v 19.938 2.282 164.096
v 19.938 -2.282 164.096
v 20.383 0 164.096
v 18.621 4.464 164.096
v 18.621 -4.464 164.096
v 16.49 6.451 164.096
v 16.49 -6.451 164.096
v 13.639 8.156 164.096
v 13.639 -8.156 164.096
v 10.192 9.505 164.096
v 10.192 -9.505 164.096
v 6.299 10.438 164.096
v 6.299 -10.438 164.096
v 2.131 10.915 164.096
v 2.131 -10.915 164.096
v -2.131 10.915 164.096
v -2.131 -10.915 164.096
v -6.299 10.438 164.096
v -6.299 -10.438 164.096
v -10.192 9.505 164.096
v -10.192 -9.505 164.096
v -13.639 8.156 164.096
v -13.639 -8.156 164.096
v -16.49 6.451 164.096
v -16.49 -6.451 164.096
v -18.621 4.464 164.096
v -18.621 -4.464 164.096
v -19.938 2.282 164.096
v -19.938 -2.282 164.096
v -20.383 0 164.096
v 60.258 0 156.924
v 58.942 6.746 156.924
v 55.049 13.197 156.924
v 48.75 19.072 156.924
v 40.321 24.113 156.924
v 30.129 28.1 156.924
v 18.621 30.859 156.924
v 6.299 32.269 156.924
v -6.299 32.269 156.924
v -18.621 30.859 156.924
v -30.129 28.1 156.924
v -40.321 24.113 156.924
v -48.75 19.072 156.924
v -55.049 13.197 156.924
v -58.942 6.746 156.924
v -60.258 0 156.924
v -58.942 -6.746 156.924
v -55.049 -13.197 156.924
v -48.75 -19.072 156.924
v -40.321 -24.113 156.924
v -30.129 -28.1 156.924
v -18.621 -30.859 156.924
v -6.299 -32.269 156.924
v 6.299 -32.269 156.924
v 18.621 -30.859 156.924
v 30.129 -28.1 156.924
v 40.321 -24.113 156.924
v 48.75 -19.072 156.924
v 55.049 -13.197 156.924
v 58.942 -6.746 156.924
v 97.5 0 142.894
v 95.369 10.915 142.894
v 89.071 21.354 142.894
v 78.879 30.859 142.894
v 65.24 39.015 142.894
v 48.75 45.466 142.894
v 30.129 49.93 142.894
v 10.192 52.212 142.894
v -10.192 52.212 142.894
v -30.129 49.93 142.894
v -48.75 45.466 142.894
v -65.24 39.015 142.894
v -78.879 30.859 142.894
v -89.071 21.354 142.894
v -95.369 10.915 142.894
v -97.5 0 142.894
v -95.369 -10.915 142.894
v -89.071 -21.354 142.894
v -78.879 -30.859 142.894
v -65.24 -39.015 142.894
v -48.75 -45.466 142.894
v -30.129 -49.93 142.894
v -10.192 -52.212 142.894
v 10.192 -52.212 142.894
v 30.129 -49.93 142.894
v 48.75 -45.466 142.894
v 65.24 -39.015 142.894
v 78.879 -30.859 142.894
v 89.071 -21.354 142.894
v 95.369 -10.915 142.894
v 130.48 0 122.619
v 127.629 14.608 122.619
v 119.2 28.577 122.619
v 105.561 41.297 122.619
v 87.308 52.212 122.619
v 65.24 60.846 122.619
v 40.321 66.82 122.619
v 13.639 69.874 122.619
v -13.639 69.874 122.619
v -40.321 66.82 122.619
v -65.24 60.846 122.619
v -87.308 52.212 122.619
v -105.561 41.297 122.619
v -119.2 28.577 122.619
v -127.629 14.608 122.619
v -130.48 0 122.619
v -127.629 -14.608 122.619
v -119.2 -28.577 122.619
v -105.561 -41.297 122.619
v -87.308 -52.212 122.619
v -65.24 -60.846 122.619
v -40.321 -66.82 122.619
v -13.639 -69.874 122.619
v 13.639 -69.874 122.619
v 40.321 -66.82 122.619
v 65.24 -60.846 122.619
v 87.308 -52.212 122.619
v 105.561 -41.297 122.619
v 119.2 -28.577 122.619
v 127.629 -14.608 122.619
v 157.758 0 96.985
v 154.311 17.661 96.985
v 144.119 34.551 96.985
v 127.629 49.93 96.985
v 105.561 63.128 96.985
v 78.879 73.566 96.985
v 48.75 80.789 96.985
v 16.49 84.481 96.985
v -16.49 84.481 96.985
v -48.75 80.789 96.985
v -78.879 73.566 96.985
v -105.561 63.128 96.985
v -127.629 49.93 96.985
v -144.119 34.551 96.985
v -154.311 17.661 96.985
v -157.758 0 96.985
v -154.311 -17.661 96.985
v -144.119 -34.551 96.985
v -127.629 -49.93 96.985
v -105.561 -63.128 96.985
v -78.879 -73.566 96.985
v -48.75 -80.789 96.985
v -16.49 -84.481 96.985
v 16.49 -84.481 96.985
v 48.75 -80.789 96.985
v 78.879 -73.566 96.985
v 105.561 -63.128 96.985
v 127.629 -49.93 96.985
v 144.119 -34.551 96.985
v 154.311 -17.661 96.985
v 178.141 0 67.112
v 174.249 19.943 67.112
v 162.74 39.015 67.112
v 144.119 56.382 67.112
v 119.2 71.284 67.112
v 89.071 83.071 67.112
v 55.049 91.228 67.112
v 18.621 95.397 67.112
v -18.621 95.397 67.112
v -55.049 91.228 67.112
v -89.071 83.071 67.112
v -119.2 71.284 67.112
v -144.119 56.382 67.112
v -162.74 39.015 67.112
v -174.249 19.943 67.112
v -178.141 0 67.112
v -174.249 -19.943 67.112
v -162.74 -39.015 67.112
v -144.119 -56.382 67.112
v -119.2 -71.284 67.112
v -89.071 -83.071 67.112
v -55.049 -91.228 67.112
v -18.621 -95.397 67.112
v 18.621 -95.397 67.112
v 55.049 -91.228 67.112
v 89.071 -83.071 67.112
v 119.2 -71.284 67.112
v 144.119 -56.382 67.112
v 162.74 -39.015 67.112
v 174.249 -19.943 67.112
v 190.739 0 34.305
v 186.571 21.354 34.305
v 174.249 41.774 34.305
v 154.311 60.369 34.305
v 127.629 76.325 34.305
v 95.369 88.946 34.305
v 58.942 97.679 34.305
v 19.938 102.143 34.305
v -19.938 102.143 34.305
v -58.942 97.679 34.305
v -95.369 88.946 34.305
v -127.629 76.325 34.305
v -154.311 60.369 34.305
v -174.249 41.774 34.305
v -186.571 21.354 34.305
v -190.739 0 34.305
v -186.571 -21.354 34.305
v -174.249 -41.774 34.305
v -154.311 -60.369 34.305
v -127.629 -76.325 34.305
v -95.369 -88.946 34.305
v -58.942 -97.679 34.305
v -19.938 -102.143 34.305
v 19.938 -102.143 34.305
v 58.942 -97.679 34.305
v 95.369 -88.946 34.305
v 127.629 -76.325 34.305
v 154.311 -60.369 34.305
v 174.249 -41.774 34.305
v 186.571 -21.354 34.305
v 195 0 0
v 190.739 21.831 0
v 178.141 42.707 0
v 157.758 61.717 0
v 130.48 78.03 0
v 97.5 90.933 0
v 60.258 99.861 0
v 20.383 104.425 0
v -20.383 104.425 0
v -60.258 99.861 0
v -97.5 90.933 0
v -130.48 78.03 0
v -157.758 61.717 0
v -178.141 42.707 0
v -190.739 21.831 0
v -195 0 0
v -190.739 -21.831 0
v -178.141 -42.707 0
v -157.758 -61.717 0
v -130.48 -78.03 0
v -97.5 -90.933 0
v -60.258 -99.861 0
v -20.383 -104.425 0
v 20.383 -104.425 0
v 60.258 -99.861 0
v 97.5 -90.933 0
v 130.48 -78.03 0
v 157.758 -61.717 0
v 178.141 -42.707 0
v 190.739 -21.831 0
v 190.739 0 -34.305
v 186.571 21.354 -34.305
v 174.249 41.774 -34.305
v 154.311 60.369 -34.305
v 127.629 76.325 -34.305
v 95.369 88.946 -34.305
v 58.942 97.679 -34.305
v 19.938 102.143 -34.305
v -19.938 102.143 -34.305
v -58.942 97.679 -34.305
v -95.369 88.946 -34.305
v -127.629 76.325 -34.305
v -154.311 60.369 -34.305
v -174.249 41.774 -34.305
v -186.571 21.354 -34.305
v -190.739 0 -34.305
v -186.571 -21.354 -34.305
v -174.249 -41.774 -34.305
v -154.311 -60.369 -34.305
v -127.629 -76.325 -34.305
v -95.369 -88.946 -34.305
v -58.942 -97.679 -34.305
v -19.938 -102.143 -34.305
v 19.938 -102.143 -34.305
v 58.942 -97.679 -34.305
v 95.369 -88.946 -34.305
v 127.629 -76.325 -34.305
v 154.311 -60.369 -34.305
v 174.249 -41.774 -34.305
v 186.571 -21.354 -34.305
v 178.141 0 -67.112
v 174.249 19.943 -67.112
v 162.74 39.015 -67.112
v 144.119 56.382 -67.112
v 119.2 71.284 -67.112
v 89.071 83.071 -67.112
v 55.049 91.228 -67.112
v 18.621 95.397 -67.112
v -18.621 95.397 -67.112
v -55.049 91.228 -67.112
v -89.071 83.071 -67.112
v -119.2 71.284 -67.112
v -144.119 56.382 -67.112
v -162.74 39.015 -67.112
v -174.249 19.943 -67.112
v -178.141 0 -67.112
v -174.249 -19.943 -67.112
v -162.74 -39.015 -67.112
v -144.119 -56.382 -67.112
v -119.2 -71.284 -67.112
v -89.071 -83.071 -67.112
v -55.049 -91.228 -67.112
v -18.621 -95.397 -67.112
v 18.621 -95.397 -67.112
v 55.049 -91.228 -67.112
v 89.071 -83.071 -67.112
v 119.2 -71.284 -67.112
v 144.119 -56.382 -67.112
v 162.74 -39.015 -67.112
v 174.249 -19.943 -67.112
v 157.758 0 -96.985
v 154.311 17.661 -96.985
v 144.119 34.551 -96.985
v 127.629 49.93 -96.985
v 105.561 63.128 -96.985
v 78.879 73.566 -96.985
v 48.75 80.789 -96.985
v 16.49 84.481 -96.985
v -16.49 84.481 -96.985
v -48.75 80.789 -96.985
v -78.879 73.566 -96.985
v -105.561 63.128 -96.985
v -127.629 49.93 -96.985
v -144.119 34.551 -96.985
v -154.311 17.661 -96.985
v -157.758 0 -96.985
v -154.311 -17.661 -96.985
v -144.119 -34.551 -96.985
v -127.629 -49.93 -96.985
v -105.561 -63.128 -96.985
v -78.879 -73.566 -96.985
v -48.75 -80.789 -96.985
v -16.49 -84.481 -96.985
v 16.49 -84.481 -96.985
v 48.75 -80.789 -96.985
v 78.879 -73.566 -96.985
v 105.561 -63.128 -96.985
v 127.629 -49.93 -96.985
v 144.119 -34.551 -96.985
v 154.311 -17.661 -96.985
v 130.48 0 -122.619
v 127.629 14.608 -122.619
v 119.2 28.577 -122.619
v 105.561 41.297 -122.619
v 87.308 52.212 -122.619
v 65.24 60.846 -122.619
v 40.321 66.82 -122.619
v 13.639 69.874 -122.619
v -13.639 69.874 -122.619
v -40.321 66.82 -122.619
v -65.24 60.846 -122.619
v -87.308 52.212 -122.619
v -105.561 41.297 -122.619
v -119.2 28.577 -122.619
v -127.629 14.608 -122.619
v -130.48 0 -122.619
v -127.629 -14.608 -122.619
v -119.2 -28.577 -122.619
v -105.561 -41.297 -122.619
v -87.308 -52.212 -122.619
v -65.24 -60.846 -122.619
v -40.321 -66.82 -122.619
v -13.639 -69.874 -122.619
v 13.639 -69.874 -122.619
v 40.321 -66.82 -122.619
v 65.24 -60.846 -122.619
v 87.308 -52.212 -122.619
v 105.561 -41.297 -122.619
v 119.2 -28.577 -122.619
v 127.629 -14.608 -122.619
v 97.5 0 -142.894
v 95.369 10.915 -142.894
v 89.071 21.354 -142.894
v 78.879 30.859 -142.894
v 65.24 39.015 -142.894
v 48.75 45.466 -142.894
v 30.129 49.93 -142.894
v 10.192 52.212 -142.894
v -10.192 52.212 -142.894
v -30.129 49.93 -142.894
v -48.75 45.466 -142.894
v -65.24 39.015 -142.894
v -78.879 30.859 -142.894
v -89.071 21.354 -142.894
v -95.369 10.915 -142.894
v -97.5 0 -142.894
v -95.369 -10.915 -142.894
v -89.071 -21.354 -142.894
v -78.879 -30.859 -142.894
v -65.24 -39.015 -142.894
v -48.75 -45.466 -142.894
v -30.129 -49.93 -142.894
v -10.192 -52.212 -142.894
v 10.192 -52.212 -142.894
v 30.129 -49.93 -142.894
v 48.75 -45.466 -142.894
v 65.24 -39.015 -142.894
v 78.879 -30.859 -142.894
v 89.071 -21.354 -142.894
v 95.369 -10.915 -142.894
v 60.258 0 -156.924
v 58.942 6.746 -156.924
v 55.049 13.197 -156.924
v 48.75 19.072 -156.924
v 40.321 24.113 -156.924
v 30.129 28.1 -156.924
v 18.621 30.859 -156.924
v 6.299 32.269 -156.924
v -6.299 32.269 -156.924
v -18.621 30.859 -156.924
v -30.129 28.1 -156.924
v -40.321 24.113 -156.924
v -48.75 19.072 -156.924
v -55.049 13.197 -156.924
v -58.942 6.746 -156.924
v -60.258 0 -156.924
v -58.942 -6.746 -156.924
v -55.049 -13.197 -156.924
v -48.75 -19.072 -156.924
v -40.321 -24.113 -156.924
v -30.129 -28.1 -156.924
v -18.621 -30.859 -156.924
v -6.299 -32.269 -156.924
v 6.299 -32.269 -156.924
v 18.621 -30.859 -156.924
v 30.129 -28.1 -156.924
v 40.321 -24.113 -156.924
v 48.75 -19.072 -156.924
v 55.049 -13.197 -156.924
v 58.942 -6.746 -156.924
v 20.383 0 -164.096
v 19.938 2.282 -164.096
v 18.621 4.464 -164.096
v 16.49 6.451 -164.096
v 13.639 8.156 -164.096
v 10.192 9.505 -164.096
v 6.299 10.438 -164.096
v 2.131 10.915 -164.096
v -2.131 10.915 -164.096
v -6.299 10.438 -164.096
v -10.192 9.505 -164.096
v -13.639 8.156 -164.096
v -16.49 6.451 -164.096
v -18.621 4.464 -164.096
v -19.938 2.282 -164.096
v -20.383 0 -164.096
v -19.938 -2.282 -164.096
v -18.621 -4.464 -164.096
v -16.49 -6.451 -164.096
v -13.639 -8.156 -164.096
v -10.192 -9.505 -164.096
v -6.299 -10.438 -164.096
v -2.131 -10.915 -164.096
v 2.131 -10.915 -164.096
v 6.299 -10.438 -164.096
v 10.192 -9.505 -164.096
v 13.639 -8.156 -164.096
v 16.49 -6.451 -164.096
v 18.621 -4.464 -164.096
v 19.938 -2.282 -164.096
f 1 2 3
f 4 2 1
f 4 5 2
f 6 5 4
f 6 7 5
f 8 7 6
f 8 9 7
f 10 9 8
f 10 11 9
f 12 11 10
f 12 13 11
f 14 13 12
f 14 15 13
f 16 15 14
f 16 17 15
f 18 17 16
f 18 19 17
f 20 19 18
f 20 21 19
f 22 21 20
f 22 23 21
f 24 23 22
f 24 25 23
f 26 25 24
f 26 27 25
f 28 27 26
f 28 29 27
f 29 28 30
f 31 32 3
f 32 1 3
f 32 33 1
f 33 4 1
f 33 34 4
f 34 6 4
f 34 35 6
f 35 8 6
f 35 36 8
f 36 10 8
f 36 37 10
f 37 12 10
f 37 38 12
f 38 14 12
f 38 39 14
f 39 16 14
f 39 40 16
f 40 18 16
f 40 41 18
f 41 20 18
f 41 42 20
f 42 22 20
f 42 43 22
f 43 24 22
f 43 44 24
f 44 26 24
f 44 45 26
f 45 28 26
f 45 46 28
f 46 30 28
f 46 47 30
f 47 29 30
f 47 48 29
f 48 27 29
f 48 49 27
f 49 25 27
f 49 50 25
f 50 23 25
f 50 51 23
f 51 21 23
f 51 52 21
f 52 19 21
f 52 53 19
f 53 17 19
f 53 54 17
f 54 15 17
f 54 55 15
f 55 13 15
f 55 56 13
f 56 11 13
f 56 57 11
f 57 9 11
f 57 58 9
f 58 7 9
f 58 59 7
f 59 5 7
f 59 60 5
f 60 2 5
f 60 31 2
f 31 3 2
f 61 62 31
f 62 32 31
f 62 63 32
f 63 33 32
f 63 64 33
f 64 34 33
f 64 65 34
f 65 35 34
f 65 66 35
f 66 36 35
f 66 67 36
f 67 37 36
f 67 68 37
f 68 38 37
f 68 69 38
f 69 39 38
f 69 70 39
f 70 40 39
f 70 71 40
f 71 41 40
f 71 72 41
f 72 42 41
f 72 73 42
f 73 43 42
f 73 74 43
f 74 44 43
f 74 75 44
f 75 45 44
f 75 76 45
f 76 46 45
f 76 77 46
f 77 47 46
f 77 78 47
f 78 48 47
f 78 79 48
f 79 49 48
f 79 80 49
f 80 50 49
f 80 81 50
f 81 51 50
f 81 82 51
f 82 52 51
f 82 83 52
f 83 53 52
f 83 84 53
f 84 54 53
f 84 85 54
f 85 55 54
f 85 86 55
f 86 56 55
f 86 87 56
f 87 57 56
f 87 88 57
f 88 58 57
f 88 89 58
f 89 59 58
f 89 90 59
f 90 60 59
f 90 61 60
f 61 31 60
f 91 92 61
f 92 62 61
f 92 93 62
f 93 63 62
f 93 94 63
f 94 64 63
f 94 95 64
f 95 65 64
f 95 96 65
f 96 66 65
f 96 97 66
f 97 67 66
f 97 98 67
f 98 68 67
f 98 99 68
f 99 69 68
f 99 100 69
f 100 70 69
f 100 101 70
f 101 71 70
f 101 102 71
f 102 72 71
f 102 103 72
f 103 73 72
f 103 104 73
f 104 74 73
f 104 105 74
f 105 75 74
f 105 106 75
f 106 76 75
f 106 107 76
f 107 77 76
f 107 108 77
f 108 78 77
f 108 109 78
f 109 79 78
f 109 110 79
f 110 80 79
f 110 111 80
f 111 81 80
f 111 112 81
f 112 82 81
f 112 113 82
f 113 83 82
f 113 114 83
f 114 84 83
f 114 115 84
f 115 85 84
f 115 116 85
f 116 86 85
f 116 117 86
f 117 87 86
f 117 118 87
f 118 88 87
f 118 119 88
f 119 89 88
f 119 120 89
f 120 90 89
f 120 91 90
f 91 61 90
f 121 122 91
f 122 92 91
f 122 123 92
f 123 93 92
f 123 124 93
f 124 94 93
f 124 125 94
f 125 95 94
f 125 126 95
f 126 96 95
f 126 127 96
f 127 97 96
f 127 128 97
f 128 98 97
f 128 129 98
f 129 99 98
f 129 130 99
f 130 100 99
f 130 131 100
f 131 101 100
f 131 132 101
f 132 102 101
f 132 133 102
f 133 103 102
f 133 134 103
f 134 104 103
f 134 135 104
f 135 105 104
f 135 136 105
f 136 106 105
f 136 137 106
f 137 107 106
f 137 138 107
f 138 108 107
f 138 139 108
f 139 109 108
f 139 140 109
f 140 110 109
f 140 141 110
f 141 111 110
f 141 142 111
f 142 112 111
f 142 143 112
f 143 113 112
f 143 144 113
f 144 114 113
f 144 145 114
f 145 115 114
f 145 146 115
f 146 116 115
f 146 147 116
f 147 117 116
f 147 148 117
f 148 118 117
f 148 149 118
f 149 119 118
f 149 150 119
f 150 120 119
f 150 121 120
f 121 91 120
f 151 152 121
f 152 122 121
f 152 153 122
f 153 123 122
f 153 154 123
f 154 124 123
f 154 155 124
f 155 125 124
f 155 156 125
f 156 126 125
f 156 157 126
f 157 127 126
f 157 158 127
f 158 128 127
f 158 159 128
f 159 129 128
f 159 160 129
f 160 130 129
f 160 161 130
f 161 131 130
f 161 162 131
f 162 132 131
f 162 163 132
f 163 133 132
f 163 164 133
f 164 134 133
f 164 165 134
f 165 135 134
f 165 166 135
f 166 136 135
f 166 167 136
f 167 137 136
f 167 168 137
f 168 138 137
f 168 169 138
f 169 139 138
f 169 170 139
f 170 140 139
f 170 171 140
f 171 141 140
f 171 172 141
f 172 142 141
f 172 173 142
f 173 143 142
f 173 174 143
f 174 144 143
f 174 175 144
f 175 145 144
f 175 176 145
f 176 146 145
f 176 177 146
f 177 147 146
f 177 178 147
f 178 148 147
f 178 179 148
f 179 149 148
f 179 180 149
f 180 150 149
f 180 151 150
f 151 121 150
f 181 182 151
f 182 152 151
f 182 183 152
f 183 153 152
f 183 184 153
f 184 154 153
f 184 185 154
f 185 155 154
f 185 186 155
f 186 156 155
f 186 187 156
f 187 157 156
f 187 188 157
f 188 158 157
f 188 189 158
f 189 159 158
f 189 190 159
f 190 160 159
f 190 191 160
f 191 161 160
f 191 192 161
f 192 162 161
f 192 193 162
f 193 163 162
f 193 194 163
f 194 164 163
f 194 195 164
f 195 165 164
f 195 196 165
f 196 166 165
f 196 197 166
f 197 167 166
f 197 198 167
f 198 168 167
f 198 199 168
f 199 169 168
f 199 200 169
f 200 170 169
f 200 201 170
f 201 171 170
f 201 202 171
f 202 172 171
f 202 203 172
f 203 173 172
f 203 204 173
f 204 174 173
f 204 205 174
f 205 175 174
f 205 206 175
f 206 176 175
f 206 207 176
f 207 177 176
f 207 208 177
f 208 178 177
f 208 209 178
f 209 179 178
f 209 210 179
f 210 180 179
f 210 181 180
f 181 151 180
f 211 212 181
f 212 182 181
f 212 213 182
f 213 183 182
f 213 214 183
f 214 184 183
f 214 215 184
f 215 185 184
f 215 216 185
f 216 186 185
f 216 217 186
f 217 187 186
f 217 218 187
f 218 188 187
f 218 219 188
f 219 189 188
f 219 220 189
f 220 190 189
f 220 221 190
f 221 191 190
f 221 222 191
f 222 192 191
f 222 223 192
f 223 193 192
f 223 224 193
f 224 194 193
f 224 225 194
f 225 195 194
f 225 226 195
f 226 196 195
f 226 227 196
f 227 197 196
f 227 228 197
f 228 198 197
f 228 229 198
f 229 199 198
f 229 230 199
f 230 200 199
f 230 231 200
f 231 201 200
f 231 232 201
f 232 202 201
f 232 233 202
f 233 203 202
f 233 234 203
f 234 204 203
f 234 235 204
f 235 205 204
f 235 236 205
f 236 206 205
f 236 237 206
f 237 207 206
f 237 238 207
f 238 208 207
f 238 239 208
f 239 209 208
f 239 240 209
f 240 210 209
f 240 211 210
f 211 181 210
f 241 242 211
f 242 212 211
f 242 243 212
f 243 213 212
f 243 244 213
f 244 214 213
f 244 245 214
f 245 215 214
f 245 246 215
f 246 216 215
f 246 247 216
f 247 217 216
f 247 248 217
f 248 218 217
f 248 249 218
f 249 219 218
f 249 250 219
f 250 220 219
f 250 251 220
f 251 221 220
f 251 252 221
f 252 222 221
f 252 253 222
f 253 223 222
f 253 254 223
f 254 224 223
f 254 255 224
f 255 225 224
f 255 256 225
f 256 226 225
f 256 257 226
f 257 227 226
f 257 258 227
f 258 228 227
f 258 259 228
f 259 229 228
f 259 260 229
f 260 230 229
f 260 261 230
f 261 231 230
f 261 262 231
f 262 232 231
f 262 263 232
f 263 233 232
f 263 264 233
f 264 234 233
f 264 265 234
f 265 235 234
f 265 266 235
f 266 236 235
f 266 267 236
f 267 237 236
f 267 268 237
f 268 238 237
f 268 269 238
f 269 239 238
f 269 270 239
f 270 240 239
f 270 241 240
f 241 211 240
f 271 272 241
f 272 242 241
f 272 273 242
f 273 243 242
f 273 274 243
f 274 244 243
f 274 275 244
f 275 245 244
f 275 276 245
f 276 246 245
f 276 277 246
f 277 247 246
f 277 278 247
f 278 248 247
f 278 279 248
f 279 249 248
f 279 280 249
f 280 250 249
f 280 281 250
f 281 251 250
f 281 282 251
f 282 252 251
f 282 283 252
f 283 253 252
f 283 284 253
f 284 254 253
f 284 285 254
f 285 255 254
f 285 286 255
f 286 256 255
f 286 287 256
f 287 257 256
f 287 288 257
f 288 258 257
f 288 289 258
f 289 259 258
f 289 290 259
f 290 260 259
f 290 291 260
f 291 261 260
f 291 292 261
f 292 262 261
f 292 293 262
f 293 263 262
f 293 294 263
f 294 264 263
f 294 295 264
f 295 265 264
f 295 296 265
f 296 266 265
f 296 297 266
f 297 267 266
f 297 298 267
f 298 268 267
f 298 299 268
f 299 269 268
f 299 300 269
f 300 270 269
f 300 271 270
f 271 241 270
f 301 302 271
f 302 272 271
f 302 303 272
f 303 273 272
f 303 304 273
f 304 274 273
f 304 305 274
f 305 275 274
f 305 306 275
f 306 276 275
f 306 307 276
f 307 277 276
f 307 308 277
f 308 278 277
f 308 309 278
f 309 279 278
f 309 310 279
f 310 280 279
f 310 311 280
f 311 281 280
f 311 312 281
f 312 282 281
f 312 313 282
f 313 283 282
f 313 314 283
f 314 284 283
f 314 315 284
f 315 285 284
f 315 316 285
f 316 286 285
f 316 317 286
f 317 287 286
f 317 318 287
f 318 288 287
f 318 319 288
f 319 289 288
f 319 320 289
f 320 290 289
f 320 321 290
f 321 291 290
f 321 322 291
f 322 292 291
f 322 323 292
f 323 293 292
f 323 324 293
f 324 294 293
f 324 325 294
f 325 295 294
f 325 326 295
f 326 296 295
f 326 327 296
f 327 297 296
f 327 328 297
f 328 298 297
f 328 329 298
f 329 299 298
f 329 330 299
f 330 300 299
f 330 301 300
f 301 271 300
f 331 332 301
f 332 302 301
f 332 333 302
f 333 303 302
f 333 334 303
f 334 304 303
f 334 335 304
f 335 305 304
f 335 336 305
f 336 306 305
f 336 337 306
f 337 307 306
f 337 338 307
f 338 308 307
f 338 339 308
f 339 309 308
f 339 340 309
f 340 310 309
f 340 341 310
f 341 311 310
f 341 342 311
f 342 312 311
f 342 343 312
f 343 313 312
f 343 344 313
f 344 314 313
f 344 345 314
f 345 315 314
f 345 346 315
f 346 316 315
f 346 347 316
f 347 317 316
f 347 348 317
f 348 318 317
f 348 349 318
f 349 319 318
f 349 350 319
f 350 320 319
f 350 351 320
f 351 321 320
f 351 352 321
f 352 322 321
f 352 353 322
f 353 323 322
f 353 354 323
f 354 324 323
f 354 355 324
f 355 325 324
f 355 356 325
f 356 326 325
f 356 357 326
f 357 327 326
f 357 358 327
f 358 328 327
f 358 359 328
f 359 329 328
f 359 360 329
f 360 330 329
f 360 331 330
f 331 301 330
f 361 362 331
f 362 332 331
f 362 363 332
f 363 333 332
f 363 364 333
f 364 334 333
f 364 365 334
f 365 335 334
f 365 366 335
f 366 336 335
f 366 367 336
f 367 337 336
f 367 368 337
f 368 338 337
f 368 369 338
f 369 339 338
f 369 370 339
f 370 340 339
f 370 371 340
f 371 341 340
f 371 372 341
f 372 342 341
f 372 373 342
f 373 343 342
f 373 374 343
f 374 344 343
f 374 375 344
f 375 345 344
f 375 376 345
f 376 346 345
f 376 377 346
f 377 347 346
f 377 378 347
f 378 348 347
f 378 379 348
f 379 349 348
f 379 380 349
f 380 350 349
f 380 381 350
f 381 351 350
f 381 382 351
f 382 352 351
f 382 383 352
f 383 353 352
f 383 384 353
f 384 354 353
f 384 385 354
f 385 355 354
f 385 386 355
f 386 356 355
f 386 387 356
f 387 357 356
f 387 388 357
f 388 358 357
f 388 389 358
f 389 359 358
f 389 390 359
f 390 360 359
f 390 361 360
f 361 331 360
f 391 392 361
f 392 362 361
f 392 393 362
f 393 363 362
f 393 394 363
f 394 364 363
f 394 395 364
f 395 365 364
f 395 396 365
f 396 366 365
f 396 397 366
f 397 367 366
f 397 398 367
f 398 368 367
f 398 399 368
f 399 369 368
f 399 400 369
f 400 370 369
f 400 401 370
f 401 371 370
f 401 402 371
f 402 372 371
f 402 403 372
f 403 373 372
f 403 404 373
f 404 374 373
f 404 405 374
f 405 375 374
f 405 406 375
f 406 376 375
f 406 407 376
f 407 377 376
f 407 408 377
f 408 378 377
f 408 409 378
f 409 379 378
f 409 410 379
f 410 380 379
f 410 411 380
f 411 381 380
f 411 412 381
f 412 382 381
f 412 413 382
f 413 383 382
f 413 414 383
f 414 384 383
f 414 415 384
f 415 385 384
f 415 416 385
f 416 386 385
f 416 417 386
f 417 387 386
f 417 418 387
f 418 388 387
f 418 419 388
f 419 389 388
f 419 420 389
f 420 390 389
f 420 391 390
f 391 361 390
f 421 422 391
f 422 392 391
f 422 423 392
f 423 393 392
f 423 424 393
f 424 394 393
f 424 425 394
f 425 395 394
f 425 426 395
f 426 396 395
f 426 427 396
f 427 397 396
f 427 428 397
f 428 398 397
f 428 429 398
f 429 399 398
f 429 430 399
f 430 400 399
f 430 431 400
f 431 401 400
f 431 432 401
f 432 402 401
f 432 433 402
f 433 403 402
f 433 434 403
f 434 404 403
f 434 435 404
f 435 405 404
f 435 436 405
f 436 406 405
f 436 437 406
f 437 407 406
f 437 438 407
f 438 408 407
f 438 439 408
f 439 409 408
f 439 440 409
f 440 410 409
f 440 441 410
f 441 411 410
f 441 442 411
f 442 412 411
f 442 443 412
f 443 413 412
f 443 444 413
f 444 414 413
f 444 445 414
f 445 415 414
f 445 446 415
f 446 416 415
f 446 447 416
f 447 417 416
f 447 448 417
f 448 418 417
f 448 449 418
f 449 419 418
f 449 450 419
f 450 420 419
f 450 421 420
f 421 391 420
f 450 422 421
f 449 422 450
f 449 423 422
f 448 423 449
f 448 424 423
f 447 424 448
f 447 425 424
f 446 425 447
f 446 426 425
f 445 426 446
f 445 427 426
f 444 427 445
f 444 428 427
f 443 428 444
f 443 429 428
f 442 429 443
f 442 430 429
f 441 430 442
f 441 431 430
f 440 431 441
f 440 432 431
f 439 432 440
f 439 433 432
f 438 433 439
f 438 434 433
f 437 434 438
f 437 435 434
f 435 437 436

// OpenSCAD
// Generated by SolidPython 1.0.1 on 2020-07-29 00:46:50


scale(v = [13, 7, 11]) {
	sphere(r = 15);
}
/***********************************************
*********      SolidPython code:      **********
************************************************
 
# import packages: SolidPython
from solid import *
from solid.utils import *
from itertools import chain, combinations, permutations


class Resize:

    def __init__(self, scad_file):
        self.scad_file = scad_file
        #self.scad_file = import_scad(scad_file)
        # cone/cylinder param:
        self.r1 = 0
        self.r2 = 0
        self.h = 0
        # rectangular prism param:
        self.w = 0
        self.l = 0
        # ellipse param:
        self.r = 0

    # import OpenScad code (file name corresponds to shape)


    # classify shape + parameters
    def assign(self, param1, param2, param3):
        if self.scad_file == 'cone.scad':
            self.r1 = param1
            self.r2 = param2
            self.h = param3
        elif self.scad_file == 'cylinder.scad':
            self.r1 = param1
            self.r2 = param2
            self.h = param3
        elif self.scad_file == 'rectangularPrism.scad':
            self.h = param1
            self.l = param2
            self.w = param3
        else:
            self.r = param1
            self.h = param2

    # resize parameters
    def iterate(self):
        x = range(3, 20, 2)
        i = 1
        if self.scad_file == 'cone.scad':
            tempList = list(permutations(x, 2))
            for temp in tempList:
                param1 = temp[0]
                param2 = temp[1]
                filepath = 'produced_scad_files/' + 'cone' + str(param1) + '_' + str(param2) + '_' + '.scad'
                scad_render_to_file(cylinder(h=param1, r1=param2, r2=0), filepath)

        elif self.scad_file == 'cylinder.scad':
            tempList = list(permutations(x, 3))
            for temp in tempList:
                param1 = temp[0]
                param2 = temp[1]
                filepath = 'produced_scad_files/' + 'cylinder' + str(param1) + '_' + str(param2) + '_' + '.scad'
                scad_render_to_file(cylinder(h=param1, r1=param2, r2=param2), filepath)

        elif self.scad_file == 'rectangularPrism.scad':
            tempList = list(permutations(x, 3))
            for temp in tempList:
                param1 = temp[0]
                param2 = temp[1]
                param3 = temp[2]
                filepath = 'produced_scad_files/' + 'rectangularPrism' + str(param1) + '_' + str(param2) + '_' + str(
                    param3) + '.scad'
                scad_render_to_file(cube(size=(param1, param2, param3)), filepath)

        elif self.scad_file == 'ellipse.scad':
            tempList = list(permutations(x, 4))
            for temp in tempList:
                param1 = temp[0]
                param2 = temp[1]
                param3 = temp[2]
                param4 = temp[3]
                filepath = 'produced_scad_files/' + 'ellipse' + str(param1) + '_' + str(param2) + '_' + str(param3) + '_' + str(param4) + '.scad'
                scad_render_to_file(scale([param1, param2, param3])(sphere(r=param4)), filepath)

    def render_to_scadfile(self):
        scad_render_to_file(scad, 'example.scad') 
 
************************************************/
